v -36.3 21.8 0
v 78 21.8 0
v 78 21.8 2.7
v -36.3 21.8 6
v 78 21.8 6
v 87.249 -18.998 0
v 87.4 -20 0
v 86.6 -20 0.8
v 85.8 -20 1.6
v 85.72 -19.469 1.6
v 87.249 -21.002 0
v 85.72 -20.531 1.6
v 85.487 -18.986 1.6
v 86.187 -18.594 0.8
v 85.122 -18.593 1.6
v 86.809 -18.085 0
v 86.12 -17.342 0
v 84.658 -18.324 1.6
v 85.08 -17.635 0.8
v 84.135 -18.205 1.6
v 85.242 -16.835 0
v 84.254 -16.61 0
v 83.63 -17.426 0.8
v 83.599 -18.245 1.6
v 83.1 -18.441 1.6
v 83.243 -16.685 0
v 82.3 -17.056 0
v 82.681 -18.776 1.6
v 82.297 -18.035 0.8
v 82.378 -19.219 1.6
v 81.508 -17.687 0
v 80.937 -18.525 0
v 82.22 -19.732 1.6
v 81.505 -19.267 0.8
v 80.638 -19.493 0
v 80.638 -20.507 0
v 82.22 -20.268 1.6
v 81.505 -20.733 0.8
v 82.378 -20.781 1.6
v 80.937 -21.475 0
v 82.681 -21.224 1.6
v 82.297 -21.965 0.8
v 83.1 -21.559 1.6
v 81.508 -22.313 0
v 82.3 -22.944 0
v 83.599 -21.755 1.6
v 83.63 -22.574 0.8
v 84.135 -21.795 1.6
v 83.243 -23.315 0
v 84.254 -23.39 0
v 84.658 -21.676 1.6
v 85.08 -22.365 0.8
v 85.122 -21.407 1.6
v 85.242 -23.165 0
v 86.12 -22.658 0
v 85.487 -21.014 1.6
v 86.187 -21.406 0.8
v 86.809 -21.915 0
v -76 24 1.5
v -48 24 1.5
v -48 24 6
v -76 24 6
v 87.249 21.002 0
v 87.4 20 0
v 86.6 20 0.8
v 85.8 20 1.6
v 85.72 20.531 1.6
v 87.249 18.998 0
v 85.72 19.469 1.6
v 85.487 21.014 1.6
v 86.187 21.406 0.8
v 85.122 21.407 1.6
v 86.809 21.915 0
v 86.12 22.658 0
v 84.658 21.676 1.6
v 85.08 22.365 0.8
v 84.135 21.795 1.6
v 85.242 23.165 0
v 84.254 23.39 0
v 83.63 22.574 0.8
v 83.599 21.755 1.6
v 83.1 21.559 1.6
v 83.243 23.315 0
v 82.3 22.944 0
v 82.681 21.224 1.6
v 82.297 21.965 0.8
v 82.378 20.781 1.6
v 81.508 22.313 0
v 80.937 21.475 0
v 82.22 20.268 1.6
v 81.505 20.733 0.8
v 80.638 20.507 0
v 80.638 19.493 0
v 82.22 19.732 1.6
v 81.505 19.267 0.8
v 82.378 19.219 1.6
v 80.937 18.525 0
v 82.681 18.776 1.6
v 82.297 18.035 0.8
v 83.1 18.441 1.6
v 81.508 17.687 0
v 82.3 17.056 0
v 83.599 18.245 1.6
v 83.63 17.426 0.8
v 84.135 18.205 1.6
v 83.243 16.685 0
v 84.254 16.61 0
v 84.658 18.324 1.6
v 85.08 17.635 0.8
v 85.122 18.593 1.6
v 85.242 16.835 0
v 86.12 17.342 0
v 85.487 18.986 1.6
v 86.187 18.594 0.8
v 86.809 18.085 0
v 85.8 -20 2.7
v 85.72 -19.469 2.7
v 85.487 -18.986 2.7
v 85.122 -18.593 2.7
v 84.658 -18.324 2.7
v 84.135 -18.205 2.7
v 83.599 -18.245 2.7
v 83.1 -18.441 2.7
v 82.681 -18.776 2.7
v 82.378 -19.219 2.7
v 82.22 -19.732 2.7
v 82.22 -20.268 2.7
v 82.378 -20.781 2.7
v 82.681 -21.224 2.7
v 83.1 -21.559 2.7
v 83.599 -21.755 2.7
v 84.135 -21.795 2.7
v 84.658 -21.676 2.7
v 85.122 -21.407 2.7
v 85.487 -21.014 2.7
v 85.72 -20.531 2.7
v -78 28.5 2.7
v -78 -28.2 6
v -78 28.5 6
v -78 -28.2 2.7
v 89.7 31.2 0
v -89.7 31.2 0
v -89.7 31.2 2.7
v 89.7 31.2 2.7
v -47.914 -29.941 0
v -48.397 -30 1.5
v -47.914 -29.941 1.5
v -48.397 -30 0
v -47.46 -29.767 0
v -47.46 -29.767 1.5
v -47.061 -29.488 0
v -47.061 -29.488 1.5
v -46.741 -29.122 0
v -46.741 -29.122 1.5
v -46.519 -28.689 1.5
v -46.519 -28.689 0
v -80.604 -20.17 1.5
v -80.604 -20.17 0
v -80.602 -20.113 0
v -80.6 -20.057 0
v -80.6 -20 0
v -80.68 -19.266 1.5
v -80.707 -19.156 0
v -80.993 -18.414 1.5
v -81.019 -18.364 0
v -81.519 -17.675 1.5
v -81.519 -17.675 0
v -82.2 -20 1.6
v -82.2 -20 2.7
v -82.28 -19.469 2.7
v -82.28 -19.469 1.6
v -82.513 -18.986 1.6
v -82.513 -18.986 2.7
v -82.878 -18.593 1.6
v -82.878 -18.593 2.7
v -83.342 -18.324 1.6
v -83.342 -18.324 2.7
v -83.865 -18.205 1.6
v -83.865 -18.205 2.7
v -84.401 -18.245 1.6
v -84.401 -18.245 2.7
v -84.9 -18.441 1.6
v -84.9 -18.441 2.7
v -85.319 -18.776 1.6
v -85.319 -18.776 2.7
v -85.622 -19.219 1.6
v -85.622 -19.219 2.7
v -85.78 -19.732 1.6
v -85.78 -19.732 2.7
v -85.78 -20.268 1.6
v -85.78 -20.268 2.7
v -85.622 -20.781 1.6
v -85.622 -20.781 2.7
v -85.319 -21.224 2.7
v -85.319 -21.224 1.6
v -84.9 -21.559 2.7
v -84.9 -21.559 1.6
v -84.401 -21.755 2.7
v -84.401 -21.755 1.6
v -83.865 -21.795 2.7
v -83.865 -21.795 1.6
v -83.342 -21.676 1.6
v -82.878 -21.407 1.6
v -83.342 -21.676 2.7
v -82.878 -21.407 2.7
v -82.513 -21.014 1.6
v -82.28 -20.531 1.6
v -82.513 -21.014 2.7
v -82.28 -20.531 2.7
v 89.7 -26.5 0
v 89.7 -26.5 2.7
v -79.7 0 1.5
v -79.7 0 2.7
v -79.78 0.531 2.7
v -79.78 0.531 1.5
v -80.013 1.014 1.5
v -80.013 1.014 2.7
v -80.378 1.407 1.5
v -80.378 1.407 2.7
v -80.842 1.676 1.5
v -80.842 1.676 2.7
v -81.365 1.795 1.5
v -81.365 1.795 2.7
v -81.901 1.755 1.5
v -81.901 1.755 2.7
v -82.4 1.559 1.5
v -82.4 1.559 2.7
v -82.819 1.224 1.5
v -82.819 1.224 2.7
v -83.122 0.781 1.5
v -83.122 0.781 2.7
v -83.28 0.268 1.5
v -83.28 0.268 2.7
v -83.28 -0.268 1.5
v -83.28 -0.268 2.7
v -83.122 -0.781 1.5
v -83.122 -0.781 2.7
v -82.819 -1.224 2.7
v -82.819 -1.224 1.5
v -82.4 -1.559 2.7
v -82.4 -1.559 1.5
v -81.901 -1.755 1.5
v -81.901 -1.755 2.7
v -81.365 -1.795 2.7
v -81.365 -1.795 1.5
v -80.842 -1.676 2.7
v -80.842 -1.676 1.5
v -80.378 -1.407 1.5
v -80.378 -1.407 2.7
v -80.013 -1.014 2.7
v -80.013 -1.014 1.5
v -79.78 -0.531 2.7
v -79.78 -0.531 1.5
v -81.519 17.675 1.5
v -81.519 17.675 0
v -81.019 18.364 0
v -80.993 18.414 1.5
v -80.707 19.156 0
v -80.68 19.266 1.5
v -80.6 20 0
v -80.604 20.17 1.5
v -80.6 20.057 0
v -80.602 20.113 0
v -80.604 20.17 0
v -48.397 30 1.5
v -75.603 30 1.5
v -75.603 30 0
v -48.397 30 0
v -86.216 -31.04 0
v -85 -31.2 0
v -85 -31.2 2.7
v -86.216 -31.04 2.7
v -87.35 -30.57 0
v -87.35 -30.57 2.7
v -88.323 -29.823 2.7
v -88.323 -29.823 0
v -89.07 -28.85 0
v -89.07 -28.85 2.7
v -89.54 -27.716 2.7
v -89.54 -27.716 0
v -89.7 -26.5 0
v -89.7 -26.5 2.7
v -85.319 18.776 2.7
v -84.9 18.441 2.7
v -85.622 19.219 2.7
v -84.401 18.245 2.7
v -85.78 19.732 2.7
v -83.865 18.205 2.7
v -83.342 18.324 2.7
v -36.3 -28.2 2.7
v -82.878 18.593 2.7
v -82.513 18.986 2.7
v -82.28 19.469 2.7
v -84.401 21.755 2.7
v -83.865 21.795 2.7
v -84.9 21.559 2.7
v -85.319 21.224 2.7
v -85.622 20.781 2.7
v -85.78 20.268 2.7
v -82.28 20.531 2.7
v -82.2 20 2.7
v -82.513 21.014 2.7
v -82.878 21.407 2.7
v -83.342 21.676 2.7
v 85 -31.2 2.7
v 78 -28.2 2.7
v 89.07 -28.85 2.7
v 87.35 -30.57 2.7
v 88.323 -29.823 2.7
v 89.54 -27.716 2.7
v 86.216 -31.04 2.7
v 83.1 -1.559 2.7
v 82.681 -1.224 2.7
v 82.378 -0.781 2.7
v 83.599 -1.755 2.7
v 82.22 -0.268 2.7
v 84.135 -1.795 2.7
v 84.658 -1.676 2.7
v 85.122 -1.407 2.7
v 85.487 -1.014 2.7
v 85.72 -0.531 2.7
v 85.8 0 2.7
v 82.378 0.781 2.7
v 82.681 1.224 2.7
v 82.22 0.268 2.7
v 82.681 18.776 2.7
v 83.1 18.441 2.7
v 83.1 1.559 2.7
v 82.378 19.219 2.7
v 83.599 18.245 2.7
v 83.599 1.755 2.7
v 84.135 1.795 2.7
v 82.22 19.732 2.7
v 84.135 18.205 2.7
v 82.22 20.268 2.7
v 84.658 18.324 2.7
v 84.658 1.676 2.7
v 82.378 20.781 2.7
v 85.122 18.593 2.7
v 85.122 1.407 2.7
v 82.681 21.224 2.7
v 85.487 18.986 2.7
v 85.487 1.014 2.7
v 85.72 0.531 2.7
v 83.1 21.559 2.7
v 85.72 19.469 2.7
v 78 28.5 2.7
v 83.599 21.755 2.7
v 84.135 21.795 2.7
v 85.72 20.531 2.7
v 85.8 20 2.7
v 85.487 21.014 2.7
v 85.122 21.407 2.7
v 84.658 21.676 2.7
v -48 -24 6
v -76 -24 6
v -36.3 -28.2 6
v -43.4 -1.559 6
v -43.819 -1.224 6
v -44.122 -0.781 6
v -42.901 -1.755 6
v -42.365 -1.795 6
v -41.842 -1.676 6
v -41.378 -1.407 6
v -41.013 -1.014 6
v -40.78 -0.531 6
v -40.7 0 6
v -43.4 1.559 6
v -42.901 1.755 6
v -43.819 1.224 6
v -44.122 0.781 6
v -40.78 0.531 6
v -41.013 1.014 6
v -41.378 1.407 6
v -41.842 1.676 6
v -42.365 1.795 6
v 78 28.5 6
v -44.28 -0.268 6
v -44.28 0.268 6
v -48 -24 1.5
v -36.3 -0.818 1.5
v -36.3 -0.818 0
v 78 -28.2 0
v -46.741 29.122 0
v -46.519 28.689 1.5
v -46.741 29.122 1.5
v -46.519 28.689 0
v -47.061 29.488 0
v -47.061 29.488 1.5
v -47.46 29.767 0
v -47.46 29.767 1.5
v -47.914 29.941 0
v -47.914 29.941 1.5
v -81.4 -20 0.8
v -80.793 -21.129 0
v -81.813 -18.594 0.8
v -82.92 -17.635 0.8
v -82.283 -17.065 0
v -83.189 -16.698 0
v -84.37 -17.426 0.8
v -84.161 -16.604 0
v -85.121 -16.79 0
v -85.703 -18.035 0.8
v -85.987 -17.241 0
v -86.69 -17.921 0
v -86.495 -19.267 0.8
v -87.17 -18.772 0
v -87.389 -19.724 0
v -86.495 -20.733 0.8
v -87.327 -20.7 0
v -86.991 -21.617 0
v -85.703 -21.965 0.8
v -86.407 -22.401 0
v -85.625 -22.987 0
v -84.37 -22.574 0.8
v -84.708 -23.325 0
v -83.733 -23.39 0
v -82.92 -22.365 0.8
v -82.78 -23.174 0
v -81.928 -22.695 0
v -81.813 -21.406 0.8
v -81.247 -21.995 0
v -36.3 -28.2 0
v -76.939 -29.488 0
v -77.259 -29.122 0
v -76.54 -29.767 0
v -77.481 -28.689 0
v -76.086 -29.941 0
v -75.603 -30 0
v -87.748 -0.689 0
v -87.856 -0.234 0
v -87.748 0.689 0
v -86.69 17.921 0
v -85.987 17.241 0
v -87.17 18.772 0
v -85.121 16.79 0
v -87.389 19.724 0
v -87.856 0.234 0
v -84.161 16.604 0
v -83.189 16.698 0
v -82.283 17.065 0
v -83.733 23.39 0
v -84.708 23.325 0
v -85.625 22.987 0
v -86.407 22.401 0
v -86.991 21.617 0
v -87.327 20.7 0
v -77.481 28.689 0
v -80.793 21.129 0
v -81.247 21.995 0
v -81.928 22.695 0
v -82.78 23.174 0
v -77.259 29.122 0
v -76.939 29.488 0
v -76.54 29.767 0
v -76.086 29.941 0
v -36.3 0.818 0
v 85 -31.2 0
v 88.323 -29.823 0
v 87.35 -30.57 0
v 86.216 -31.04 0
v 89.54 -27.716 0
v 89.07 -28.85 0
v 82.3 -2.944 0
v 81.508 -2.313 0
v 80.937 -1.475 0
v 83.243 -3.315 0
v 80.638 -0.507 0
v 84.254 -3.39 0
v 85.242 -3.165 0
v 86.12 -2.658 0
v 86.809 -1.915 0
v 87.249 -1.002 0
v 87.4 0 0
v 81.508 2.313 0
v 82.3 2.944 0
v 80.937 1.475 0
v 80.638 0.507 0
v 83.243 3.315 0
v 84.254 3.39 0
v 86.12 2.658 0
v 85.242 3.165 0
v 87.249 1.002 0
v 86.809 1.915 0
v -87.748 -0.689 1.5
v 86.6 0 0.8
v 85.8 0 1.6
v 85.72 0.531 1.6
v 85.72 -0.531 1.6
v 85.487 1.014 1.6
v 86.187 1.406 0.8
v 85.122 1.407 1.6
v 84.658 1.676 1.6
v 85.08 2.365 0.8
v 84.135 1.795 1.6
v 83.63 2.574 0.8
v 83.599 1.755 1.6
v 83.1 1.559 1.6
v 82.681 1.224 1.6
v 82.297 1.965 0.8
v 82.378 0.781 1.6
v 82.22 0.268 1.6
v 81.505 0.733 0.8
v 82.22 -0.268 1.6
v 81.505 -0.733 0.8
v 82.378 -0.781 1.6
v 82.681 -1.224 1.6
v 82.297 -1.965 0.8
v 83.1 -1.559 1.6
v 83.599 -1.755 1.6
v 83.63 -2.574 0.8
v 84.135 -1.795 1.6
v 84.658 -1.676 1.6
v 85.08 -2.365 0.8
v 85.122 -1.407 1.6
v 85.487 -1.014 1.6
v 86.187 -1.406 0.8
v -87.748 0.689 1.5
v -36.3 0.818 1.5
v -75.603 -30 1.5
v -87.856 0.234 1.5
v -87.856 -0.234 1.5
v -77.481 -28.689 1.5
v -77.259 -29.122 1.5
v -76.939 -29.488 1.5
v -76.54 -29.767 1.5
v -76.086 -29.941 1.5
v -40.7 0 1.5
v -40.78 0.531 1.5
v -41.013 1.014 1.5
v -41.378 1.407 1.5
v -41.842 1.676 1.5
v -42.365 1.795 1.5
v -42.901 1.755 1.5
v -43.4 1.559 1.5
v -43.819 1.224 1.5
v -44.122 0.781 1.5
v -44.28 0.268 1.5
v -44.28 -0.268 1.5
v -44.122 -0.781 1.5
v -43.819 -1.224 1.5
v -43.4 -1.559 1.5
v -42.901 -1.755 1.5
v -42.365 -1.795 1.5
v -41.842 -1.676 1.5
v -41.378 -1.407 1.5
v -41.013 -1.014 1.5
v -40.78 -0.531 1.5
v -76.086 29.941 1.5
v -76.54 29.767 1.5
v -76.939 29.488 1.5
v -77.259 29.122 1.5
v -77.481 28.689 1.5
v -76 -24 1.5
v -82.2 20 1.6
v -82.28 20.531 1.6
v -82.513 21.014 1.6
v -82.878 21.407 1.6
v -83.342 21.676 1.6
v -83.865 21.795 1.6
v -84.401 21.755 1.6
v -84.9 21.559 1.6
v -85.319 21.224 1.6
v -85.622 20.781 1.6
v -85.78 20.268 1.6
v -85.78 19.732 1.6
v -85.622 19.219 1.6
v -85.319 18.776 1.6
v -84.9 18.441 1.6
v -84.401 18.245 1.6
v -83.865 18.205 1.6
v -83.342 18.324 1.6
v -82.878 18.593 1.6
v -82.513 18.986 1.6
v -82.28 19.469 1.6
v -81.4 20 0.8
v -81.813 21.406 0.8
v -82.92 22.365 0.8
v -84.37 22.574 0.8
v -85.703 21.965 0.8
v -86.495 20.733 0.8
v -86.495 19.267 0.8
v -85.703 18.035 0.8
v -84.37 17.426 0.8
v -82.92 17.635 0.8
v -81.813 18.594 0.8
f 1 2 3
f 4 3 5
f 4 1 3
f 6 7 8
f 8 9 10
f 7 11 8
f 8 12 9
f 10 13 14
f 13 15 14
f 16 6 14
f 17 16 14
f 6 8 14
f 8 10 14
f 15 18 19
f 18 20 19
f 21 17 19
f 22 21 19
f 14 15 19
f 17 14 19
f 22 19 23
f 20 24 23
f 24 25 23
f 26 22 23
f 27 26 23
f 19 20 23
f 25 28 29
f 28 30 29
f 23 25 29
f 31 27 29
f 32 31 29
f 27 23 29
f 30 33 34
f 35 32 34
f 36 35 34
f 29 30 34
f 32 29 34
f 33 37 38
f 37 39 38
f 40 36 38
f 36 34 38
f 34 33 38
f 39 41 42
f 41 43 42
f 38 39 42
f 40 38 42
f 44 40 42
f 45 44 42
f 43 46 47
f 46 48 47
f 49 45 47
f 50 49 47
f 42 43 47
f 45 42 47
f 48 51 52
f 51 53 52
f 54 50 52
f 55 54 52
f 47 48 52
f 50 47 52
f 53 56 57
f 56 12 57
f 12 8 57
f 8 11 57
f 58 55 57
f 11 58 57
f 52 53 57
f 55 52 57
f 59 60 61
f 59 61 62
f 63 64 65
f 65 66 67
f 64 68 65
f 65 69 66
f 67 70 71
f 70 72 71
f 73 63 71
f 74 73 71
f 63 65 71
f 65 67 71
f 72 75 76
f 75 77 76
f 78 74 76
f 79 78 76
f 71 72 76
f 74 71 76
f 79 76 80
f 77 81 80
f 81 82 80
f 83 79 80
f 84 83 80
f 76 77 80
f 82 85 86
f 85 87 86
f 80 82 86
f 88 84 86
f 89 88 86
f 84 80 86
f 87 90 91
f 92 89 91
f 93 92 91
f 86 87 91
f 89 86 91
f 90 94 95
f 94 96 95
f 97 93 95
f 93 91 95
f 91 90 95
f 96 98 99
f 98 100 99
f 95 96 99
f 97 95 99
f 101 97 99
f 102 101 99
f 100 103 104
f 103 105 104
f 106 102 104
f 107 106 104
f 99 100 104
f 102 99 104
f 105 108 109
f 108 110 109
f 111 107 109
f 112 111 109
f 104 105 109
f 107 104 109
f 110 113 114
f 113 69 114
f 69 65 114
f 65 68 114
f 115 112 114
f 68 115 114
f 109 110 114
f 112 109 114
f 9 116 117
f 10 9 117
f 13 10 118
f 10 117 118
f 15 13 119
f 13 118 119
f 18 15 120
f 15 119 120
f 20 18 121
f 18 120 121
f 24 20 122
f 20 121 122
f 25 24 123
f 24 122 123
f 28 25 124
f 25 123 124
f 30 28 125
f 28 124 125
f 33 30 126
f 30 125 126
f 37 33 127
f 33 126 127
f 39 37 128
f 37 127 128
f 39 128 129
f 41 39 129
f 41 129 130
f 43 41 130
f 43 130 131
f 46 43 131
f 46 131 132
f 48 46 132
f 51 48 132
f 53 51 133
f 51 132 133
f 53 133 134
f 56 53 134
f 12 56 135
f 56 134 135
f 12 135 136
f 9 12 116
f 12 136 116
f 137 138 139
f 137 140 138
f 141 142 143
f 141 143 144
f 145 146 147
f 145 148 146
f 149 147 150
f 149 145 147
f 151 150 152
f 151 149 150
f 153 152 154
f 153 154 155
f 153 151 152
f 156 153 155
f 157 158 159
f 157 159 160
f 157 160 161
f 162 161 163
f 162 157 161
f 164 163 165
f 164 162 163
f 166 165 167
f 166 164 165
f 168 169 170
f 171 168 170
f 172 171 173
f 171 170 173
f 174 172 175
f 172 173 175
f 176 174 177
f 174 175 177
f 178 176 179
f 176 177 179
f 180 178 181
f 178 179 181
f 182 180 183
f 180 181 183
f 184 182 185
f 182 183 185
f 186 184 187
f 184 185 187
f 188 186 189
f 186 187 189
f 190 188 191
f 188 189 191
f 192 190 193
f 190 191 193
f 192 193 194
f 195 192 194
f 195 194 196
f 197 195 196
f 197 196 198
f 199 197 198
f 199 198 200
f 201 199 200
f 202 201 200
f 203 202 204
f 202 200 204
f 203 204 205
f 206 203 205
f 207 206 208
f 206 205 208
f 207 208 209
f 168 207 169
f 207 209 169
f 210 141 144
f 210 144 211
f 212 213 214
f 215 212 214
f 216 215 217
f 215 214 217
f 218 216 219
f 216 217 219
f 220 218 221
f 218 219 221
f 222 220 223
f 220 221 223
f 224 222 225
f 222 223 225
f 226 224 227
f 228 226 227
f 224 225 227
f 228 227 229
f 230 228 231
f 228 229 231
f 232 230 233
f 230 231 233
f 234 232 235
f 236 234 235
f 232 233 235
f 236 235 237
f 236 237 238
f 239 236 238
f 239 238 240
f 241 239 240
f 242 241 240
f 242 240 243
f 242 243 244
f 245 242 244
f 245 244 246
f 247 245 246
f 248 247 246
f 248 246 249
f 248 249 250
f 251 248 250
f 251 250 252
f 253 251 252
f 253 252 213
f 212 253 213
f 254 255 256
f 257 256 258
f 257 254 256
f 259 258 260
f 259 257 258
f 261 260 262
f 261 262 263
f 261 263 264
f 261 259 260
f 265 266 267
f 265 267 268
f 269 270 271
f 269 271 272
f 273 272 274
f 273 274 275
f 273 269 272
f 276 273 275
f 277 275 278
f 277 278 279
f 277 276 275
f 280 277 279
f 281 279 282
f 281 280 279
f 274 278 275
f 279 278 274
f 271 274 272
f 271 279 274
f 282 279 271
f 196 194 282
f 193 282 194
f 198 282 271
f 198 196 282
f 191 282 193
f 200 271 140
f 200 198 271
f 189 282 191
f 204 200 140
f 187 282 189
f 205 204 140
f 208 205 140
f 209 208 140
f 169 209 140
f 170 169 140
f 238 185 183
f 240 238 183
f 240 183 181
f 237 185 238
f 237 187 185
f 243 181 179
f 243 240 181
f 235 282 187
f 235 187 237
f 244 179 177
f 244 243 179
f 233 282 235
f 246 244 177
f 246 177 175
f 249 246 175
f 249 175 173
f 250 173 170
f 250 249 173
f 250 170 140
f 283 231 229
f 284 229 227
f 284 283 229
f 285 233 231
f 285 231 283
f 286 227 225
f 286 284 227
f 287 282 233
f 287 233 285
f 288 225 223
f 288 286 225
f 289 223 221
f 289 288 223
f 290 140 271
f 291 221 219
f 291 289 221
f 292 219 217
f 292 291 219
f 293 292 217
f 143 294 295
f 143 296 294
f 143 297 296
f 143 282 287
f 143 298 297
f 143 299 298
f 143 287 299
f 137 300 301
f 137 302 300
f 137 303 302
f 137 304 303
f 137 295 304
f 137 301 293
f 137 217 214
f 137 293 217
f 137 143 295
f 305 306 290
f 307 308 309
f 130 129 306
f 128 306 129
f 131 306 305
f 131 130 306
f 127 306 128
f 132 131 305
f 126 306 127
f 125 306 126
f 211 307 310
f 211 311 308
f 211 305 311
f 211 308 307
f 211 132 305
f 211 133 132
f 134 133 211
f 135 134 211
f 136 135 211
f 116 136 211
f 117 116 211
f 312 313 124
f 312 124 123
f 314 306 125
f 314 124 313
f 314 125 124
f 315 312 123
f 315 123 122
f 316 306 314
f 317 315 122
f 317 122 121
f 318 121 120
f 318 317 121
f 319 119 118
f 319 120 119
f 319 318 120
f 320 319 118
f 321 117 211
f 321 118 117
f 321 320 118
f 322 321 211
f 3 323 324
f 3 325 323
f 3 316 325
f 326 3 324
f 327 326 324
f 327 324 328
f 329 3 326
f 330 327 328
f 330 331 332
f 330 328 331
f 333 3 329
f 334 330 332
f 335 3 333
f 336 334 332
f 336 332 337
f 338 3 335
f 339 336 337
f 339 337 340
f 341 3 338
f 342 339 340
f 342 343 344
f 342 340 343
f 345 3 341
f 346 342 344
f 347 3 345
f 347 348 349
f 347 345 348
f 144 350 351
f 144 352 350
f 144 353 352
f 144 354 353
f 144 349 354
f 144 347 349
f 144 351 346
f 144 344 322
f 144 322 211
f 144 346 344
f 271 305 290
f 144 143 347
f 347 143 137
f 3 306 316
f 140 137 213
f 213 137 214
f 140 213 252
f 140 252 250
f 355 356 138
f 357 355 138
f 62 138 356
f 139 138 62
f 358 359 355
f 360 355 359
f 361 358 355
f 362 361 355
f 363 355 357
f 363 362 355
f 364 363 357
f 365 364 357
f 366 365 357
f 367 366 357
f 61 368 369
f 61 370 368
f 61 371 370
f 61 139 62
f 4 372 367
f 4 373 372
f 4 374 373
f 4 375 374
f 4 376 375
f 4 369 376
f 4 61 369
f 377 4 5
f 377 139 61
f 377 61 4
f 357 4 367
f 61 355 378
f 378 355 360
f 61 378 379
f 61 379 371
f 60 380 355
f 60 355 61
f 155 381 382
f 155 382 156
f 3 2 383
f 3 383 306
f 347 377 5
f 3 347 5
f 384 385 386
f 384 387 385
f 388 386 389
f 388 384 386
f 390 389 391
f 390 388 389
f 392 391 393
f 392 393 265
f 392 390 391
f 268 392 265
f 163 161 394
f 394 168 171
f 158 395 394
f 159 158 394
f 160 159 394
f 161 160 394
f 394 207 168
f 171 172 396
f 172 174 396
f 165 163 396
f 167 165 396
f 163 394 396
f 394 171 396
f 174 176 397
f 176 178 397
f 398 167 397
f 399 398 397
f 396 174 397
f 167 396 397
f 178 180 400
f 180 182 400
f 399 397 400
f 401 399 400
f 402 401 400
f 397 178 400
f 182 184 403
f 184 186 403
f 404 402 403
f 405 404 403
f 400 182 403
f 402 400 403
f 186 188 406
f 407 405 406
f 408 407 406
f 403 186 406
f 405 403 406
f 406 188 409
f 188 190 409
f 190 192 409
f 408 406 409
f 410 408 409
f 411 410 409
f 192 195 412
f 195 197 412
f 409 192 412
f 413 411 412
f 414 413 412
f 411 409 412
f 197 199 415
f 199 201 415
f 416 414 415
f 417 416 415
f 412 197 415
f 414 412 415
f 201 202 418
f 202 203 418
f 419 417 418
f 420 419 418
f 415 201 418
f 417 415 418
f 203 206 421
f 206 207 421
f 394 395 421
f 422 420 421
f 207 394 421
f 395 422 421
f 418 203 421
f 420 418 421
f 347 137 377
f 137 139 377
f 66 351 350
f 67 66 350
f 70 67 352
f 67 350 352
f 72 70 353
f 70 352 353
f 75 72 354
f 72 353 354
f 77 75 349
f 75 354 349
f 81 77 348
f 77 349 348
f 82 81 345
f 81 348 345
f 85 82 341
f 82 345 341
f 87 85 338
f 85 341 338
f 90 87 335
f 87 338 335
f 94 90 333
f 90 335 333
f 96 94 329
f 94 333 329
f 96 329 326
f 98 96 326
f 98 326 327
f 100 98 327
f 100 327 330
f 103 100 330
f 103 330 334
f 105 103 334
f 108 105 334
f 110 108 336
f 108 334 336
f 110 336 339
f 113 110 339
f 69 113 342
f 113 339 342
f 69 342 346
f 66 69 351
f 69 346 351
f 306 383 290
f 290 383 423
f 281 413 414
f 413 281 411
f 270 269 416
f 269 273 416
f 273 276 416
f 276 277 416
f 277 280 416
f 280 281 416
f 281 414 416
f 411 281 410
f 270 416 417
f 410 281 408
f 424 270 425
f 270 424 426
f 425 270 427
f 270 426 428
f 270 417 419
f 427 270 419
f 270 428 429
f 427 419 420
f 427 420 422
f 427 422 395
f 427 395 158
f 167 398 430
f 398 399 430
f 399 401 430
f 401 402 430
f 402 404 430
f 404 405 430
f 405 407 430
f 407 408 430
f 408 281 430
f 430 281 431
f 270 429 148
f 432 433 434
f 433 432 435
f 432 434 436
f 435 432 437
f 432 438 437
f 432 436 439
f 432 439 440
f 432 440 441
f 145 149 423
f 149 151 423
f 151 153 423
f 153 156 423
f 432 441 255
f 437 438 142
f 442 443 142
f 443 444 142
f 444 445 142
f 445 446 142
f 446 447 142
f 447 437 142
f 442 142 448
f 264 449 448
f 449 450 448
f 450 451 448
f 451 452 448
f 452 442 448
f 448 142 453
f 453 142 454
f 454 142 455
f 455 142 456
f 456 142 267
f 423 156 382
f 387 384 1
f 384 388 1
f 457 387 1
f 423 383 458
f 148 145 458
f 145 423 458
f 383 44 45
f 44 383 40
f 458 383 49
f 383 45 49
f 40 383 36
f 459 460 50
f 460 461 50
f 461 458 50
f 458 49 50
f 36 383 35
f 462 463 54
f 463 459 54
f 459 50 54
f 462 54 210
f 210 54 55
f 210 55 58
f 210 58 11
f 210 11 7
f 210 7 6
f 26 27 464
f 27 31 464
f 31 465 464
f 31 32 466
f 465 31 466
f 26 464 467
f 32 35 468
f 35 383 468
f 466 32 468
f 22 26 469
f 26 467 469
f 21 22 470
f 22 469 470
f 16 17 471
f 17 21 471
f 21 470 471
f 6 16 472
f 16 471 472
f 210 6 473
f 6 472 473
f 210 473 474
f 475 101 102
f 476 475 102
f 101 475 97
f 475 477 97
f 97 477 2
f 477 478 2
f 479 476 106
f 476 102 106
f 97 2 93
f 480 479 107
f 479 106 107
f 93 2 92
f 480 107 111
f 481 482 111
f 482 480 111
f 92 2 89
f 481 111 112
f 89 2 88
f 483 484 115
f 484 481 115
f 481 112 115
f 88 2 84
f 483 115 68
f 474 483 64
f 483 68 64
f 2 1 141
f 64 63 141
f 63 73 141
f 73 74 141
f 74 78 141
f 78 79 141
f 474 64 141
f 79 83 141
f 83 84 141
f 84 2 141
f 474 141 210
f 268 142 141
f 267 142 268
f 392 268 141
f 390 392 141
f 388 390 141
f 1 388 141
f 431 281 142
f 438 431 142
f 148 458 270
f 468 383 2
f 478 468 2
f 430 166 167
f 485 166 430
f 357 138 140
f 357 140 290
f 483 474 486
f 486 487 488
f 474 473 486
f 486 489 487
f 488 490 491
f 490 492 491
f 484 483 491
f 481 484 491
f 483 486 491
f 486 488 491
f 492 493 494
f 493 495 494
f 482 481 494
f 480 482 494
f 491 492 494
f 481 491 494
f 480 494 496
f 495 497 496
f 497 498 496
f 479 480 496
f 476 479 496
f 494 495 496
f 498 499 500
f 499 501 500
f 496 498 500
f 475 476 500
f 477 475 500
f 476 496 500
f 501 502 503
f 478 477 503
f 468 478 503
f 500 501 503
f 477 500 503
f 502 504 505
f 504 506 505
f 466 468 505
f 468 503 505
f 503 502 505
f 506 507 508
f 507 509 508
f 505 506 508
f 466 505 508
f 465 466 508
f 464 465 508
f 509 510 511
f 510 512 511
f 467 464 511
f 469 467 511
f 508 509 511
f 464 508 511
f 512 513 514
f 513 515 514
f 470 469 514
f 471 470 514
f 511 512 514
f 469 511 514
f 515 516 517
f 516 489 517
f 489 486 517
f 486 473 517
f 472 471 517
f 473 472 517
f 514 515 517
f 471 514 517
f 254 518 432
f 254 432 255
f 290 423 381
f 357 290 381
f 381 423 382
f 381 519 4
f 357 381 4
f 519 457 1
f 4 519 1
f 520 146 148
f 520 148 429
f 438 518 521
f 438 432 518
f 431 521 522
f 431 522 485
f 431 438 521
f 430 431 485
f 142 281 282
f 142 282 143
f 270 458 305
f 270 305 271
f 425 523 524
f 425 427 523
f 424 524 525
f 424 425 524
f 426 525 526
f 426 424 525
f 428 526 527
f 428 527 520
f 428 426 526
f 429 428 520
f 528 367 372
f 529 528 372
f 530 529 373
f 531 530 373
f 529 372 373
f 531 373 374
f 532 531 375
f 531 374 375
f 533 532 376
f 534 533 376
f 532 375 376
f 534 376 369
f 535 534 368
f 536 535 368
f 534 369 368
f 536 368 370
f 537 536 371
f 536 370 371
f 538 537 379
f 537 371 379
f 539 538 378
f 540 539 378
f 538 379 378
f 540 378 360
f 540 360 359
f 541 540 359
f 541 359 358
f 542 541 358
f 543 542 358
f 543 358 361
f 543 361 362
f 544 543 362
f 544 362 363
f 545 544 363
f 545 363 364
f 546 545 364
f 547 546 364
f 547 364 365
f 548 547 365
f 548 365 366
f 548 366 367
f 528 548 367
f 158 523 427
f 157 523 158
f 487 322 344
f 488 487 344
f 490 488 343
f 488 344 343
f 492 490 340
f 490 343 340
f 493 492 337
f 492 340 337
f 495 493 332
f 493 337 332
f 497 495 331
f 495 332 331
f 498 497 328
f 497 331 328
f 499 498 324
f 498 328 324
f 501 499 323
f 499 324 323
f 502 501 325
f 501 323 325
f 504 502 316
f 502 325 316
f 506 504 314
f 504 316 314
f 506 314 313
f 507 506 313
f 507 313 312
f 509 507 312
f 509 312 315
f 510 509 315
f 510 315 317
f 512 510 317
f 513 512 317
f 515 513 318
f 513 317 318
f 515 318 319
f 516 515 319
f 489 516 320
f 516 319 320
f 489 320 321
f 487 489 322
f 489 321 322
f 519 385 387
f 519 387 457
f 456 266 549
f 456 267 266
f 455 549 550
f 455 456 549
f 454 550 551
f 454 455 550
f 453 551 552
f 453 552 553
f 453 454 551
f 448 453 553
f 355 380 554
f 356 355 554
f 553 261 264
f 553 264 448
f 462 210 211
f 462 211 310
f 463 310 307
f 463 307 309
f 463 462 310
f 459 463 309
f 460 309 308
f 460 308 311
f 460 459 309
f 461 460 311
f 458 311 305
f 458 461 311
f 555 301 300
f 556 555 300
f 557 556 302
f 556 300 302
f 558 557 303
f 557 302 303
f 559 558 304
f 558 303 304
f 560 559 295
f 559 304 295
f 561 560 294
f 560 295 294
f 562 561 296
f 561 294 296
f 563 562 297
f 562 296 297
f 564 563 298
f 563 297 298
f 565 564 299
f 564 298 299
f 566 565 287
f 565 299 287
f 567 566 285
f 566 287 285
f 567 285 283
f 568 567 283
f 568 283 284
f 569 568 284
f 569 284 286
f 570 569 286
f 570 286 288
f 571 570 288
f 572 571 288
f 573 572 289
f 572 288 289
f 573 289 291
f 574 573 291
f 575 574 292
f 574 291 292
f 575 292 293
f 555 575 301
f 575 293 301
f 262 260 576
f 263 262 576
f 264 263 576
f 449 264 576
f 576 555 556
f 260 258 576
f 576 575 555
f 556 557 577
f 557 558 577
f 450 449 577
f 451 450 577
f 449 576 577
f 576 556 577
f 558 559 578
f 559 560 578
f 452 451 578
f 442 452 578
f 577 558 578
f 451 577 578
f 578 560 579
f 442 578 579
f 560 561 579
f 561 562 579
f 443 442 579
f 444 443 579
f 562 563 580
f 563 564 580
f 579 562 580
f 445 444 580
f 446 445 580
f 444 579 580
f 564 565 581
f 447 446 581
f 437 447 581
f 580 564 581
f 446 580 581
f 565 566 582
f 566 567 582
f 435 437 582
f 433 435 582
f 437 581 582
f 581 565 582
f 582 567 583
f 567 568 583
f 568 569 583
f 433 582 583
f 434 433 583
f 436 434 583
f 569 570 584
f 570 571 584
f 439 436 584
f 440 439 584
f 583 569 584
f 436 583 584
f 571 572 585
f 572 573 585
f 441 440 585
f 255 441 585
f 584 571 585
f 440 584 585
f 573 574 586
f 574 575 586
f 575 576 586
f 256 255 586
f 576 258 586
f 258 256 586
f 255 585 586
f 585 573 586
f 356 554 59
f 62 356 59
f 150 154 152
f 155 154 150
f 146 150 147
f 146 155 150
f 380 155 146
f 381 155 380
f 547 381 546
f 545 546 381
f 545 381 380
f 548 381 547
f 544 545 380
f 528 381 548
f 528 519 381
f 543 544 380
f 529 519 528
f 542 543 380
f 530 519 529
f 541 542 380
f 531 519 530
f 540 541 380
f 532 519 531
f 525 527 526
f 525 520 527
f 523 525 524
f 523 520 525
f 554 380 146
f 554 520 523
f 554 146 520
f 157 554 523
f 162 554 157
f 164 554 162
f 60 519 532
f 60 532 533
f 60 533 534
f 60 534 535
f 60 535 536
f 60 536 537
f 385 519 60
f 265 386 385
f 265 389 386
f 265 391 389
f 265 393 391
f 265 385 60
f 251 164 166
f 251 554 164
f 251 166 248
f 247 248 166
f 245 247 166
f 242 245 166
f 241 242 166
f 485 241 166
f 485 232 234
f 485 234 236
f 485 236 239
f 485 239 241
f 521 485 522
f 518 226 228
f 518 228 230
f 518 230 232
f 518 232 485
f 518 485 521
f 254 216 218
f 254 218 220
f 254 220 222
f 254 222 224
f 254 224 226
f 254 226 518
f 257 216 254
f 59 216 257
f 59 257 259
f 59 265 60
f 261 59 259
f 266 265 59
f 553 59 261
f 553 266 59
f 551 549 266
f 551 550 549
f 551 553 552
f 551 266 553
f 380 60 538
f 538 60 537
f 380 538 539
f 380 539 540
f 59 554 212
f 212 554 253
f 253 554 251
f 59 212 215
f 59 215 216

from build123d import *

# Parameters (mm, degrees)
SKETCH1_W                                       = 180
SKETCH1_H                                       = 63
BOSS_EXTRUDE1_DEPTH                             = 3
FILLET1_R                                       = 5
SKETCH2_W                                       = 156
SKETCH2_H                                       = 63
BOSS_EXTRUDE2_DEPTH                             = 6
CSK_FOR_M3_FLAT_HEAD_MACHINE_SCREW1_D           = 3.6
CSK_FOR_M3_FLAT_HEAD_MACHINE_SCREW1_DEPTH       = 8
CSK_FOR_M3_FLAT_HEAD_MACHINE_SCREW1_CSINK_D     = 6.8
CSK_FOR_M3_FLAT_HEAD_MACHINE_SCREW1_CSINK_ANGLE = 90
CSK_FOR_M3_FLAT_HEAD_MACHINE_SCREW1_TIP         = 1.081549114
CUT_EXTRUDE1_START                              = -1.5
CUT_EXTRUDE1_DEPTH                              = 1.5
SKETCH6_W                                       = 28
SKETCH6_H                                       = 48
CUT_EXTRUDE2_DEPTH                              = 96.647791402
FILLET2_R                                       = 2
M3_CLEARANCE_HOLE1_D                            = 3.6
M3_CLEARANCE_HOLE1_DEPTH                        = 8
M3_CLEARANCE_HOLE1_TIP                          = 1.081549114
SKETCH15_W                                      = 95
SKETCH15_H                                      = 63
CUT_EXTRUDE3_DEPTH                              = 3
SKETCH18_W                                      = 180
SKETCH18_H                                      = 8
CUT_EXTRUDE8_DEPTH                              = 3
SKETCH21_W                                      = 4
SKETCH21_H                                      = 60
CUT_EXTRUDE10_DEPTH                             = 3
SKETCH22_W                                      = 3
SKETCH22_H                                      = 60
CUT_EXTRUDE11_DEPTH                             = 116.733530146
CUT_EXTRUDE12_DEPTH                             = 0.3
CUT_EXTRUDE13_DEPTH                             = 96.541875636
SKETCH25_W                                      = 114
SKETCH25_H                                      = 50
CUT_EXTRUDE14_DEPTH                             = 96.160548548
SKETCH26_W                                      = 6
SKETCH26_H                                      = 50
CUT_EXTRUDE15_DEPTH                             = 0.3
SKETCH28_W                                      = 156
SKETCH28_H                                      = 3
CUT_EXTRUDE16_DEPTH                             = 3.3


# Read off the part's stored shape, not the designer's step: Cut-Extrude1
with BuildPart() as part:
    # Sketch1 → Boss-Extrude1 (new body)
    with BuildSketch(Plane.XY):
        Rectangle(SKETCH1_W, SKETCH1_H)
    extrude(amount=BOSS_EXTRUDE1_DEPTH)

    # Fillet1
    fillet1_edges = [part.edges().sort_by_distance(p)[0] for p in [
        (90, -31.5, 1.5),
        (-90, -31.5, 1.5),
    ]]
    fillet(fillet1_edges, radius=FILLET1_R)

    # Sketch2 → Boss-Extrude2 (add)
    with BuildSketch(Plane.XY.offset(3)):
        Rectangle(SKETCH2_W, SKETCH2_H)
    extrude(amount=BOSS_EXTRUDE2_DEPTH)

    # CSK for M3 Flat Head Machine Screw1
    with Locations(Plane(origin=(0, 0, 0), x_dir=(-1, 0, 0), z_dir=(0, 0, -1))):
        with Locations((-84, 20), (-84, -20), (84, 20), (84, -20), (-84, 0)):
            CounterSinkHole(CSK_FOR_M3_FLAT_HEAD_MACHINE_SCREW1_D / 2, CSK_FOR_M3_FLAT_HEAD_MACHINE_SCREW1_CSINK_D / 2, depth=CSK_FOR_M3_FLAT_HEAD_MACHINE_SCREW1_DEPTH, counter_sink_angle=CSK_FOR_M3_FLAT_HEAD_MACHINE_SCREW1_CSINK_ANGLE)
            with Locations((0, 0, -(CSK_FOR_M3_FLAT_HEAD_MACHINE_SCREW1_DEPTH + CSK_FOR_M3_FLAT_HEAD_MACHINE_SCREW1_TIP / 2))):  # 118° drill point
                Cone(0, CSK_FOR_M3_FLAT_HEAD_MACHINE_SCREW1_D / 2, CSK_FOR_M3_FLAT_HEAD_MACHINE_SCREW1_TIP, mode=Mode.SUBTRACT)

    # Cut-Extrude1 outline → Cut-Extrude1 (cut)
    with BuildSketch(Plane(origin=(0, 0, 0), x_dir=(-1, 0, 0), z_dir=(0, 0, -1)).offset(CUT_EXTRUDE1_START)):
        with BuildLine():
            Line((77, 30), (47, 30))
            Line((47, 30), (36, 0))
            Line((36, 0), (47, -30))
            Line((47, -30), (77, -30))
            Line((77, -30), (80.604262356, -20.170193575))
            ThreePointArc((80.604262356, -20.170193575), (80.807820526, -18.829534193), (81.519146067, -17.67505618))
            Line((81.519146067, -17.67505618), (88, 0))
            Line((88, 0), (81.519146067, 17.67505618))
            ThreePointArc((81.519146067, 17.67505618), (80.807820526, 18.829534193), (80.604262356, 20.170193575))
            Line((80.604262356, 20.170193575), (77, 30))
        make_face()
    extrude(amount=CUT_EXTRUDE1_DEPTH, mode=Mode.SUBTRACT)

    # Sketch6 → Cut-Extrude2 (cut, through all)
    with BuildSketch(Plane(origin=(0, 0, 1.5), x_dir=(-1, 0, 0), z_dir=(0, 0, -1))):
        with Locations((62, 0)):
            Rectangle(SKETCH6_W, SKETCH6_H)
    extrude(amount=-CUT_EXTRUDE2_DEPTH, mode=Mode.SUBTRACT)

    # Fillet2
    fillet2_edges = [part.edges().sort_by_distance(p)[0] for p in [
        (-36, 0, 0.75),
        (-47, 30, 0.75),
        (-77, 30, 0.75),
        (-88, 0, 0.75),
        (-77, -30, 0.75),
        (-47, -30, 0.75),
    ]]
    fillet(fillet2_edges, radius=FILLET2_R)

    # M3 Clearance Hole1
    with Locations(Plane(origin=(0, 0, 1.5), x_dir=(-1, 0, 0), z_dir=(0, 0, -1))):
        with Locations((42.5, 0), (81.5, 0)):
            Hole(M3_CLEARANCE_HOLE1_D / 2, depth=M3_CLEARANCE_HOLE1_DEPTH)
            with Locations((0, 0, -(M3_CLEARANCE_HOLE1_DEPTH + M3_CLEARANCE_HOLE1_TIP / 2))):  # 118° drill point
                Cone(0, M3_CLEARANCE_HOLE1_D / 2, M3_CLEARANCE_HOLE1_TIP, mode=Mode.SUBTRACT)

    # Sketch15 → Cut-Extrude3 (cut)
    with BuildSketch(Plane.XY.offset(9)):
        with Locations((26.5, 0)):
            Rectangle(SKETCH15_W, SKETCH15_H)
    extrude(amount=-CUT_EXTRUDE3_DEPTH, mode=Mode.SUBTRACT)

    # Sketch18 → Cut-Extrude8 (cut)
    with BuildSketch(Plane(origin=(0, 31.5, 0), x_dir=(1, 0, 0), z_dir=(0, 1, 0))):
        with Locations((0, -7)):
            Rectangle(SKETCH18_W, SKETCH18_H)
    extrude(amount=-CUT_EXTRUDE8_DEPTH, mode=Mode.SUBTRACT)

    # Sketch21 → Cut-Extrude10 (cut)
    with BuildSketch(Plane.XY.offset(9)):
        with Locations((76, -1.5)):
            Rectangle(SKETCH21_W, SKETCH21_H)
    extrude(amount=-CUT_EXTRUDE10_DEPTH, mode=Mode.SUBTRACT)

    # Sketch22 → Cut-Extrude11 (cut, through all)
    with BuildSketch(Plane(origin=(-21, 0, 0), x_dir=(0, 0, -1), z_dir=(1, 0, 0))):
        with Locations((-7.5, -1.5)):
            Rectangle(SKETCH22_W, SKETCH22_H)
    extrude(amount=-CUT_EXTRUDE11_DEPTH, mode=Mode.SUBTRACT)

    # Sketch23 → Cut-Extrude12 (cut)
    with BuildSketch(Plane.XY.offset(3)):
        with BuildLine():
            Line((90, 31.5), (-90, 31.5))
            Line((-90, 31.5), (-90, -26.5))
            ThreePointArc((-90, -26.5), (-88.535533906, -30.035533906), (-85, -31.5))
            Line((-85, -31.5), (-78, -31.5))
            Line((-78, -31.5), (-78, 28.5))
            Line((-78, 28.5), (78, 28.5))
            Line((78, 28.5), (78, -31.5))
            Line((78, -31.5), (85, -31.5))
            ThreePointArc((85, -31.5), (88.535533906, -30.035533906), (90, -26.5))
            Line((90, -26.5), (90, 31.5))
        make_face()
    extrude(amount=-CUT_EXTRUDE12_DEPTH, mode=Mode.SUBTRACT)

    # Sketch24 → Cut-Extrude13 (cut, through all)
    with BuildSketch(Plane(origin=(0, 0, 0), x_dir=(-1, 0, 0), z_dir=(0, 0, -1))):
        with BuildLine():
            Line((90, 31.5), (90, -26.5))
            ThreePointArc((90, -26.5), (88.535533906, -30.035533906), (85, -31.5))
            Line((85, -31.5), (-85, -31.5))
            ThreePointArc((-85, -31.5), (-88.535533906, -30.035533906), (-90, -26.5))
            Line((-90, -26.5), (-90, 31.5))
            Line((-90, 31.5), (90, 31.5))
        make_face()
        with BuildLine():
            Line((-85, -31.2), (85, -31.2))
            ThreePointArc((85, -31.2), (88.323401872, -29.823401872), (89.7, -26.5))
            Line((89.7, -26.5), (89.7, 31.2))
            Line((89.7, 31.2), (-89.7, 31.2))
            Line((-89.7, 31.2), (-89.7, -26.5))
            ThreePointArc((-89.7, -26.5), (-88.323401872, -29.823401872), (-85, -31.2))
        make_face(mode=Mode.SUBTRACT)
    extrude(amount=-CUT_EXTRUDE13_DEPTH, mode=Mode.SUBTRACT)

    # Sketch25 → Cut-Extrude14 (cut, through all)
    with BuildSketch(Plane(origin=(0, 0, 0), x_dir=(-1, 0, 0), z_dir=(0, 0, -1))):
        with Locations((-20.7, -3.2)):
            Rectangle(SKETCH25_W, SKETCH25_H)
    extrude(amount=-CUT_EXTRUDE14_DEPTH, mode=Mode.SUBTRACT)

    # Sketch26 → Cut-Extrude15 (cut)
    with BuildSketch(Plane.ZY.offset(-77.7)):
        with Locations((3, -3.2)):
            Rectangle(SKETCH26_W, SKETCH26_H)
    extrude(amount=-CUT_EXTRUDE15_DEPTH, mode=Mode.SUBTRACT)

    # Sketch28 → Cut-Extrude16 (cut)
    with BuildSketch(Plane.XY.offset(6)):
        with Locations((0, -29.7)):
            Rectangle(SKETCH28_W, SKETCH28_H)
    extrude(amount=-CUT_EXTRUDE16_DEPTH, mode=Mode.SUBTRACT)


solid = part.part
